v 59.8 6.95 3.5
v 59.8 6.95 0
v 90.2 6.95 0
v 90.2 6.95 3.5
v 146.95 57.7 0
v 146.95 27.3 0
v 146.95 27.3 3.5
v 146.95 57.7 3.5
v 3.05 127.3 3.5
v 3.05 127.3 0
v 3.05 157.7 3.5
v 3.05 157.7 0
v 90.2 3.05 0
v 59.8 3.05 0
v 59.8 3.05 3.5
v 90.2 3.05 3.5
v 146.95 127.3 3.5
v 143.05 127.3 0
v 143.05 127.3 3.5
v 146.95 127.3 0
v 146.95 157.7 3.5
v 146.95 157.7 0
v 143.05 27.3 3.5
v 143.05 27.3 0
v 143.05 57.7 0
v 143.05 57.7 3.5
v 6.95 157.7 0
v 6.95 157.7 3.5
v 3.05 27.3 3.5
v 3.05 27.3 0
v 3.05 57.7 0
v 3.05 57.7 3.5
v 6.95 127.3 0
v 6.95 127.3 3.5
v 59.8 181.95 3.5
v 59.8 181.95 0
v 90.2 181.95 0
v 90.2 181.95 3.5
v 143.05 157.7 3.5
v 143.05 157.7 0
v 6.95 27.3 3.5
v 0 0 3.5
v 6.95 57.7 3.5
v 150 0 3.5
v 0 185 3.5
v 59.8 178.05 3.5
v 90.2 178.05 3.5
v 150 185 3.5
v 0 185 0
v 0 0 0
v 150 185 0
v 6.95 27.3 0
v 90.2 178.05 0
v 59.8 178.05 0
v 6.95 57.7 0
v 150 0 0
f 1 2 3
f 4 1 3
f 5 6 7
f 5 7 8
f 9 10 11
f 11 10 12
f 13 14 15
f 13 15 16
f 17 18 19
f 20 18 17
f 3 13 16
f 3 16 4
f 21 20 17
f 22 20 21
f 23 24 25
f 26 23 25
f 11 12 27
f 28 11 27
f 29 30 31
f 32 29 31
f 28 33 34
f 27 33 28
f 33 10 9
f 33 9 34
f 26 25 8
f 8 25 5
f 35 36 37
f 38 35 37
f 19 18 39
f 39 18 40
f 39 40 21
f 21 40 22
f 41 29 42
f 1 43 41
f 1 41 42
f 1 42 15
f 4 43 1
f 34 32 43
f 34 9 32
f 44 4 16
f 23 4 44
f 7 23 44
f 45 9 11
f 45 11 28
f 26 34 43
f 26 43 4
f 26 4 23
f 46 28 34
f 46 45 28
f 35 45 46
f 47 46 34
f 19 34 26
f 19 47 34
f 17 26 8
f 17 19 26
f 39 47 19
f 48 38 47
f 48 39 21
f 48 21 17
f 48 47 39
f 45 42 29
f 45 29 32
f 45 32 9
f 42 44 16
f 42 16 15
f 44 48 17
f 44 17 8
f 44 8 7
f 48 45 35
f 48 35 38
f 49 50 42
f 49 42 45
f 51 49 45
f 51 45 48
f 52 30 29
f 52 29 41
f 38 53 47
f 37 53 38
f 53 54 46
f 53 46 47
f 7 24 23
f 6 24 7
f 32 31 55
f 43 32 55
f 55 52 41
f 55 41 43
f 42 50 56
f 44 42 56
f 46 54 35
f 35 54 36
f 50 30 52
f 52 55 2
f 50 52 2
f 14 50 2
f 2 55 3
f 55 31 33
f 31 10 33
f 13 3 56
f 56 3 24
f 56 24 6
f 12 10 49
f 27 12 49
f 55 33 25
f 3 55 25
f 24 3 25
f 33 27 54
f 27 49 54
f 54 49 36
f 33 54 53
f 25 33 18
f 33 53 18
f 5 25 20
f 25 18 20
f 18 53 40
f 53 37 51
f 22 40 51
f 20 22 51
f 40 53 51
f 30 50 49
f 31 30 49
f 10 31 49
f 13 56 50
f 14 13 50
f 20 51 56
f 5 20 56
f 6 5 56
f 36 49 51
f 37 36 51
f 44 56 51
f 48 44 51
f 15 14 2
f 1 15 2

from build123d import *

# Parameters (mm, degrees)
SKETCH_1_W      = 150
SKETCH_1_H      = 185
SKETCH_1_W_2    = 3.9
SKETCH_1_H_2    = 30.4
SKETCH_1_W_3    = 30.4
SKETCH_1_H_3    = 3.9
EXTRUDE_1_DEPTH = 3.5


with BuildPart() as part:
    # Эскиз1 → Бобышка-Вытянуть1 (new body)
    with BuildSketch(Plane.XY):
        with Locations((75, 92.5)):
            Rectangle(SKETCH_1_W, SKETCH_1_H)
        with Locations((5, 42.5)):
            Rectangle(SKETCH_1_W_2, SKETCH_1_H_2, mode=Mode.SUBTRACT)
        with Locations((5, 142.5)):
            Rectangle(SKETCH_1_W_2, SKETCH_1_H_2, mode=Mode.SUBTRACT)
        with Locations((145, 42.5)):
            Rectangle(SKETCH_1_W_2, SKETCH_1_H_2, mode=Mode.SUBTRACT)
        with Locations((145, 142.5)):
            Rectangle(SKETCH_1_W_2, SKETCH_1_H_2, mode=Mode.SUBTRACT)
        with Locations((75, 5)):
            Rectangle(SKETCH_1_W_3, SKETCH_1_H_3, mode=Mode.SUBTRACT)
        with Locations((75, 180)):
            Rectangle(SKETCH_1_W_3, SKETCH_1_H_3, mode=Mode.SUBTRACT)
    extrude(amount=EXTRUDE_1_DEPTH)


solid = part.part
